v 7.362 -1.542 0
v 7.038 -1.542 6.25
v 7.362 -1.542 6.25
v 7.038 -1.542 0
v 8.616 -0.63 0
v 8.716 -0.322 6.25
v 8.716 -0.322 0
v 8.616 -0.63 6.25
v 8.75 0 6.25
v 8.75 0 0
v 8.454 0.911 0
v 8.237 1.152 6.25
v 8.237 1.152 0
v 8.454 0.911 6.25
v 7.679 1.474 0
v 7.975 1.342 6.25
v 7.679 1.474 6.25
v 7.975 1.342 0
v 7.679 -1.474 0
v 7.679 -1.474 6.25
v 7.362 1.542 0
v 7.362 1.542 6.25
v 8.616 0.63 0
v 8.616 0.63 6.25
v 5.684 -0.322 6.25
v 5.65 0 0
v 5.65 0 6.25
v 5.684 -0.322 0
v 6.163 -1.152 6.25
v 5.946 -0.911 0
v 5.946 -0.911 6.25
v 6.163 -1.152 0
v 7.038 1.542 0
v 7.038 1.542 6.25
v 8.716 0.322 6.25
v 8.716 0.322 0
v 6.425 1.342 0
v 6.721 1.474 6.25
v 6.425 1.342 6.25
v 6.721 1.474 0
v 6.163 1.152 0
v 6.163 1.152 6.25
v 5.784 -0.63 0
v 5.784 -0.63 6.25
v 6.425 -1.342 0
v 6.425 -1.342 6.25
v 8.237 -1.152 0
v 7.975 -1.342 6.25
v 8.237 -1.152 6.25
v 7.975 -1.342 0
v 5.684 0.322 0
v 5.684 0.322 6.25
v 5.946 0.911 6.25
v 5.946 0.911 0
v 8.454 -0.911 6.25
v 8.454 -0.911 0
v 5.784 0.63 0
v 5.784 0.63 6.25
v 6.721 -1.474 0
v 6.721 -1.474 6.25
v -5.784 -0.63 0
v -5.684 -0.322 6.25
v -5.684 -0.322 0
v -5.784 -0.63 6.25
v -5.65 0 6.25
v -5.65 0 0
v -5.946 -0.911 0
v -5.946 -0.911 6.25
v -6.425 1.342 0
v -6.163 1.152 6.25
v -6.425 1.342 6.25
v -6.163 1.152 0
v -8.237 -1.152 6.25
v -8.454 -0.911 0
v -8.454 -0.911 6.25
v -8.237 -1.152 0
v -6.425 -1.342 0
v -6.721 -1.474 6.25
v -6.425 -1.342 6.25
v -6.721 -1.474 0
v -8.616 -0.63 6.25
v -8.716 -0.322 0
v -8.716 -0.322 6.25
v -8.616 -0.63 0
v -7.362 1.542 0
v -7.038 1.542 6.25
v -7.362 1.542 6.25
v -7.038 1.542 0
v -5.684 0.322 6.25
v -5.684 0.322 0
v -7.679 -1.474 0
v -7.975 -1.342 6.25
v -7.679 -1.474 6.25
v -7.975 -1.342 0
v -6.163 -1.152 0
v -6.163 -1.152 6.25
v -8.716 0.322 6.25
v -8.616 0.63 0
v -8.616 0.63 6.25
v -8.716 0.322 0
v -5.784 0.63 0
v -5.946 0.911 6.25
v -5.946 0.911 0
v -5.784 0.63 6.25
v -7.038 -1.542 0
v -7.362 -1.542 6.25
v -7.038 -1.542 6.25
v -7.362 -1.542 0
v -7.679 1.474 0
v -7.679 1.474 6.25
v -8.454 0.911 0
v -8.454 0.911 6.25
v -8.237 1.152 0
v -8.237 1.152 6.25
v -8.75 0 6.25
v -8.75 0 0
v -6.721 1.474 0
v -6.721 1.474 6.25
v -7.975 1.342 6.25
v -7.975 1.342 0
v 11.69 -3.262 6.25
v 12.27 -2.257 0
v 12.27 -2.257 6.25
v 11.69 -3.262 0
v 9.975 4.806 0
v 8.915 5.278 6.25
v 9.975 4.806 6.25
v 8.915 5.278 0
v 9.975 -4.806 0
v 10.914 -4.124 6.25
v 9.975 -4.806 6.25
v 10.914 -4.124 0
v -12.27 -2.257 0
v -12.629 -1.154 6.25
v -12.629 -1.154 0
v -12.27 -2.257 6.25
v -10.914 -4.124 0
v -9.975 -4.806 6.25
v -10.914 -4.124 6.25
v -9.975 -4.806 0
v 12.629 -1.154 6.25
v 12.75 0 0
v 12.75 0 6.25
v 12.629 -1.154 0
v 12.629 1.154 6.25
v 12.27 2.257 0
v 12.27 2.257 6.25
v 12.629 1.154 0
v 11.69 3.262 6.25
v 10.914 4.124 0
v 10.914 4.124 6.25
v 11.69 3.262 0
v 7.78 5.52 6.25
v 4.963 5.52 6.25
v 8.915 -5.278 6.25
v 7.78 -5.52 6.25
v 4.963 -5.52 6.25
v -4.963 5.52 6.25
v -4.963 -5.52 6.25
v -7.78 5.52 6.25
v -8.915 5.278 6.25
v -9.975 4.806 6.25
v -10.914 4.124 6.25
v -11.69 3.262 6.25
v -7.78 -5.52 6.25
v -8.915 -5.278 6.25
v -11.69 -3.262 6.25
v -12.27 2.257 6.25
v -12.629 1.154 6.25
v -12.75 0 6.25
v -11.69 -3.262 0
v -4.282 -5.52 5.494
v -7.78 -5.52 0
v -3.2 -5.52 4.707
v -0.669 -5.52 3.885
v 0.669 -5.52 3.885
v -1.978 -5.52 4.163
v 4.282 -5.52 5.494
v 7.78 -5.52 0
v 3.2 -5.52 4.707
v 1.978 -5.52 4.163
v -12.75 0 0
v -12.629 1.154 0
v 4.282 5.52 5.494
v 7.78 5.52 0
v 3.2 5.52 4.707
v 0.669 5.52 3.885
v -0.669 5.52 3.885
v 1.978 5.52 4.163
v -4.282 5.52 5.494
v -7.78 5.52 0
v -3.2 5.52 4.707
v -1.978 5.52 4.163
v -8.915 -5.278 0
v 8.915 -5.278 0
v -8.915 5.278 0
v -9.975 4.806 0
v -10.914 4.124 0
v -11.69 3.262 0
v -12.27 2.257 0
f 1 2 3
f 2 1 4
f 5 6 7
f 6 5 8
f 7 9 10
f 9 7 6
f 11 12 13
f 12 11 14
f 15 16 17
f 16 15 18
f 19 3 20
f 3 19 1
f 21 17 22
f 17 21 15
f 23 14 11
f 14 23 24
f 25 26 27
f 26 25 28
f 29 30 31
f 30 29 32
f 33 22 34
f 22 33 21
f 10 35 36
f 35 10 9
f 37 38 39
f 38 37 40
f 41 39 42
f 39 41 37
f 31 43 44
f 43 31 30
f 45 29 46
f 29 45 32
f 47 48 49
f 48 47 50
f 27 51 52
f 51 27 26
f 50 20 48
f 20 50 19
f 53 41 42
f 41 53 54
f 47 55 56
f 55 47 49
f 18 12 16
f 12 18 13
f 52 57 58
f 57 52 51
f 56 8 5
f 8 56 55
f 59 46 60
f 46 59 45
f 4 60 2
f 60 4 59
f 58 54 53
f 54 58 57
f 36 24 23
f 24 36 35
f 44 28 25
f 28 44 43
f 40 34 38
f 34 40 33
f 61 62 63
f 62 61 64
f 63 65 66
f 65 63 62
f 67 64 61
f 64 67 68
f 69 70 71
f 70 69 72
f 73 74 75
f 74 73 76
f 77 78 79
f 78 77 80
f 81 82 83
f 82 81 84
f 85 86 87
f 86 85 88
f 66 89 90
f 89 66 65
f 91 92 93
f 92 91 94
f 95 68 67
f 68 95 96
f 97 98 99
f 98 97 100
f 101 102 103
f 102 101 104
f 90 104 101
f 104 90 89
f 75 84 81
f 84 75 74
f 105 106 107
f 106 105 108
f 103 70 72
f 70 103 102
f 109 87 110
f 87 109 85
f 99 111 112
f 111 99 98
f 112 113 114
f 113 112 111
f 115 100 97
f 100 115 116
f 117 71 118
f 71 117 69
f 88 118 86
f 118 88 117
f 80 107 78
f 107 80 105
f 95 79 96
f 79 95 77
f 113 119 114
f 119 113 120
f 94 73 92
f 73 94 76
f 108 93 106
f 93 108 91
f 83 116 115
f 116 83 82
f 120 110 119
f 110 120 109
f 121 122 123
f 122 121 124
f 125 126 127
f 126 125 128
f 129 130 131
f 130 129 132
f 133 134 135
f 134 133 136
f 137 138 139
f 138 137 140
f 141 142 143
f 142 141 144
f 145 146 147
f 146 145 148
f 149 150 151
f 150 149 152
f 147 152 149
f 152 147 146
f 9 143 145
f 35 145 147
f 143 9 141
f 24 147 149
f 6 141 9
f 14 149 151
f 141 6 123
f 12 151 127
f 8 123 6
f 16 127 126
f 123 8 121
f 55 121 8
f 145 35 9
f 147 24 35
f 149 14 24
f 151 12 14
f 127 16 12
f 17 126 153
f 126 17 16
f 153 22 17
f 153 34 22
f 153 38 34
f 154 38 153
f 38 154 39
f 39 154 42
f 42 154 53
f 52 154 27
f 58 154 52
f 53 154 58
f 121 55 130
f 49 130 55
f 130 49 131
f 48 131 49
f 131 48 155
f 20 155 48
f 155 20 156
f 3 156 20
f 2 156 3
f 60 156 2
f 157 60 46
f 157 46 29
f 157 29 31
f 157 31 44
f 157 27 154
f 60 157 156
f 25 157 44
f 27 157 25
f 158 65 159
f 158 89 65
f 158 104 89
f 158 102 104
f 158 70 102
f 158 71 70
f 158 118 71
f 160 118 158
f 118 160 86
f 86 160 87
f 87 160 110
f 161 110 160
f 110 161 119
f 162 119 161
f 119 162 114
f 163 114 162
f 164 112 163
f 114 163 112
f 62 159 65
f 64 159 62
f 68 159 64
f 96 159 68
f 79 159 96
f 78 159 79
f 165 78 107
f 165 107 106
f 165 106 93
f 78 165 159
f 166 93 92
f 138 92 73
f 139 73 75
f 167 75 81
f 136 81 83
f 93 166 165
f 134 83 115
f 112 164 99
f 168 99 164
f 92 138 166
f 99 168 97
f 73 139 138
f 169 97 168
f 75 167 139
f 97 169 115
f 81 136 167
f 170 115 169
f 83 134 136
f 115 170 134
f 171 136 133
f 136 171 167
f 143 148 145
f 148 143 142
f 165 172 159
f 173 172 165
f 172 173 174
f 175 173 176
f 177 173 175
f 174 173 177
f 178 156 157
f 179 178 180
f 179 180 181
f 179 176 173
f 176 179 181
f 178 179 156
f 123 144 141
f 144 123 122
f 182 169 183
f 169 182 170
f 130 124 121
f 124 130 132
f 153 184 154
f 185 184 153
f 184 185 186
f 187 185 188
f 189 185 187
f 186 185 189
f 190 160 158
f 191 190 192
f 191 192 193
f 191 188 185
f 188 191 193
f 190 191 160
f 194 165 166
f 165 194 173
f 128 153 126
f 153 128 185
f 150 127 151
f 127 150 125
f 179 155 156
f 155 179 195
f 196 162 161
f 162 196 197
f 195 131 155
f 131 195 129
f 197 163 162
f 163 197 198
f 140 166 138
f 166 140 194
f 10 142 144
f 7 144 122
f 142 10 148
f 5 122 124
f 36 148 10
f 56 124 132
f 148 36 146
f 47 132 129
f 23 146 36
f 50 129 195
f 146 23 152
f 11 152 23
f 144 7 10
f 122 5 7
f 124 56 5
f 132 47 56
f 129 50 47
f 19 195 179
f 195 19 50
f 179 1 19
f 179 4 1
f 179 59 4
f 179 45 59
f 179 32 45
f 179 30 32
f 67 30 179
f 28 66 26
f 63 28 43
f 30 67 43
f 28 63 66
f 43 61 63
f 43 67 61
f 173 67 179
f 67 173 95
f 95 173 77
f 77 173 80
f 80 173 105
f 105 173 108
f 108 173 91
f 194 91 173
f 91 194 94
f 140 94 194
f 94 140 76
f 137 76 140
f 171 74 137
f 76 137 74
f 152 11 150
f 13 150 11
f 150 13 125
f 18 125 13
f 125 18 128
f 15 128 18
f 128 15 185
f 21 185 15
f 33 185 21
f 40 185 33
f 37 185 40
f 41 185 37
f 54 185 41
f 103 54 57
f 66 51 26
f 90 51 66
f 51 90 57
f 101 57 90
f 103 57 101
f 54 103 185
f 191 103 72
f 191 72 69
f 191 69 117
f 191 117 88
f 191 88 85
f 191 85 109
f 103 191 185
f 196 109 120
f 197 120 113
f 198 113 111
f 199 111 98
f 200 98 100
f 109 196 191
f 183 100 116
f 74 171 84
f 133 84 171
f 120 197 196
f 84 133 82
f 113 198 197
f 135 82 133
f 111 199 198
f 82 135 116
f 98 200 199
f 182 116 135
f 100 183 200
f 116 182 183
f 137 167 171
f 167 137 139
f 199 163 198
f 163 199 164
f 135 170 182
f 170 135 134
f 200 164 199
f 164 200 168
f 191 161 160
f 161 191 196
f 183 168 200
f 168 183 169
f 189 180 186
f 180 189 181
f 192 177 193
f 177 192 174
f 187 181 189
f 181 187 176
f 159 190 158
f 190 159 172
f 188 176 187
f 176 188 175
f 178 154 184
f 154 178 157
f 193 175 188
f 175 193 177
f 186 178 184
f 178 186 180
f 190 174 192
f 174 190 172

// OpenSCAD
$fn=30;

screw_hole_dist=14.4;
screw_hole_dia=3.3-0.2;
screw_hole_rad=screw_hole_dia/2;
total_body_width=12.5;
vert_offset = 4.0;

pen_rad=6;//4;
gap_size=0.4;

module screw_hole(dist, rad, height) {
    cylinder(h=height, r=rad);
}

module screw_holes(dist, rad, height) {
    translate([0,height/2,0]) 
    rotate([90,0,0]) {
        translate([dist/2,0,0])
        screw_hole(dist, rad, height);
        translate([-dist/2,0,0])
        screw_hole(dist, rad, height);
    }
}

screw_wall_thick=4;
module mount_body(body_width) {
    difference() {
    hull()
    screw_holes(screw_hole_dist, screw_hole_rad+screw_wall_thick, body_width);
    screw_holes(screw_hole_dist, screw_hole_rad, 10*body_width);
    }
}

module body_half(body_width) {
    difference() {
    mount_body(body_width);
    translate([0,vert_offset+body_width/2,-50/2])
    cylinder(h=10*pen_rad, r=pen_rad+gap_size);
    }
}

module parts_together() {
    translate([0,-(total_body_width/2/2+gap_size)])
    body_half(total_body_width/2);
    rotate([180,0,0])
    translate([0,-(total_body_width/2/2+gap_size)])
    body_half(total_body_width/2);
}

module print_parts() {
    translate([0,total_body_width,0])
    rotate([90,0,0])
    body_half(total_body_width/2);
    translate([0,total_body_width,0])
    rotate([90,0,0])
    body_half(total_body_width/2);
}

module one_half() {
    translate([0,0,total_body_width/4])
    rotate([90,0,0])
    body_half(total_body_width/2);
    //translate([0,total_body_width,0])
    //rotate([90,0,0])
    //body_half(total_body_width/2);
}

one_half();
